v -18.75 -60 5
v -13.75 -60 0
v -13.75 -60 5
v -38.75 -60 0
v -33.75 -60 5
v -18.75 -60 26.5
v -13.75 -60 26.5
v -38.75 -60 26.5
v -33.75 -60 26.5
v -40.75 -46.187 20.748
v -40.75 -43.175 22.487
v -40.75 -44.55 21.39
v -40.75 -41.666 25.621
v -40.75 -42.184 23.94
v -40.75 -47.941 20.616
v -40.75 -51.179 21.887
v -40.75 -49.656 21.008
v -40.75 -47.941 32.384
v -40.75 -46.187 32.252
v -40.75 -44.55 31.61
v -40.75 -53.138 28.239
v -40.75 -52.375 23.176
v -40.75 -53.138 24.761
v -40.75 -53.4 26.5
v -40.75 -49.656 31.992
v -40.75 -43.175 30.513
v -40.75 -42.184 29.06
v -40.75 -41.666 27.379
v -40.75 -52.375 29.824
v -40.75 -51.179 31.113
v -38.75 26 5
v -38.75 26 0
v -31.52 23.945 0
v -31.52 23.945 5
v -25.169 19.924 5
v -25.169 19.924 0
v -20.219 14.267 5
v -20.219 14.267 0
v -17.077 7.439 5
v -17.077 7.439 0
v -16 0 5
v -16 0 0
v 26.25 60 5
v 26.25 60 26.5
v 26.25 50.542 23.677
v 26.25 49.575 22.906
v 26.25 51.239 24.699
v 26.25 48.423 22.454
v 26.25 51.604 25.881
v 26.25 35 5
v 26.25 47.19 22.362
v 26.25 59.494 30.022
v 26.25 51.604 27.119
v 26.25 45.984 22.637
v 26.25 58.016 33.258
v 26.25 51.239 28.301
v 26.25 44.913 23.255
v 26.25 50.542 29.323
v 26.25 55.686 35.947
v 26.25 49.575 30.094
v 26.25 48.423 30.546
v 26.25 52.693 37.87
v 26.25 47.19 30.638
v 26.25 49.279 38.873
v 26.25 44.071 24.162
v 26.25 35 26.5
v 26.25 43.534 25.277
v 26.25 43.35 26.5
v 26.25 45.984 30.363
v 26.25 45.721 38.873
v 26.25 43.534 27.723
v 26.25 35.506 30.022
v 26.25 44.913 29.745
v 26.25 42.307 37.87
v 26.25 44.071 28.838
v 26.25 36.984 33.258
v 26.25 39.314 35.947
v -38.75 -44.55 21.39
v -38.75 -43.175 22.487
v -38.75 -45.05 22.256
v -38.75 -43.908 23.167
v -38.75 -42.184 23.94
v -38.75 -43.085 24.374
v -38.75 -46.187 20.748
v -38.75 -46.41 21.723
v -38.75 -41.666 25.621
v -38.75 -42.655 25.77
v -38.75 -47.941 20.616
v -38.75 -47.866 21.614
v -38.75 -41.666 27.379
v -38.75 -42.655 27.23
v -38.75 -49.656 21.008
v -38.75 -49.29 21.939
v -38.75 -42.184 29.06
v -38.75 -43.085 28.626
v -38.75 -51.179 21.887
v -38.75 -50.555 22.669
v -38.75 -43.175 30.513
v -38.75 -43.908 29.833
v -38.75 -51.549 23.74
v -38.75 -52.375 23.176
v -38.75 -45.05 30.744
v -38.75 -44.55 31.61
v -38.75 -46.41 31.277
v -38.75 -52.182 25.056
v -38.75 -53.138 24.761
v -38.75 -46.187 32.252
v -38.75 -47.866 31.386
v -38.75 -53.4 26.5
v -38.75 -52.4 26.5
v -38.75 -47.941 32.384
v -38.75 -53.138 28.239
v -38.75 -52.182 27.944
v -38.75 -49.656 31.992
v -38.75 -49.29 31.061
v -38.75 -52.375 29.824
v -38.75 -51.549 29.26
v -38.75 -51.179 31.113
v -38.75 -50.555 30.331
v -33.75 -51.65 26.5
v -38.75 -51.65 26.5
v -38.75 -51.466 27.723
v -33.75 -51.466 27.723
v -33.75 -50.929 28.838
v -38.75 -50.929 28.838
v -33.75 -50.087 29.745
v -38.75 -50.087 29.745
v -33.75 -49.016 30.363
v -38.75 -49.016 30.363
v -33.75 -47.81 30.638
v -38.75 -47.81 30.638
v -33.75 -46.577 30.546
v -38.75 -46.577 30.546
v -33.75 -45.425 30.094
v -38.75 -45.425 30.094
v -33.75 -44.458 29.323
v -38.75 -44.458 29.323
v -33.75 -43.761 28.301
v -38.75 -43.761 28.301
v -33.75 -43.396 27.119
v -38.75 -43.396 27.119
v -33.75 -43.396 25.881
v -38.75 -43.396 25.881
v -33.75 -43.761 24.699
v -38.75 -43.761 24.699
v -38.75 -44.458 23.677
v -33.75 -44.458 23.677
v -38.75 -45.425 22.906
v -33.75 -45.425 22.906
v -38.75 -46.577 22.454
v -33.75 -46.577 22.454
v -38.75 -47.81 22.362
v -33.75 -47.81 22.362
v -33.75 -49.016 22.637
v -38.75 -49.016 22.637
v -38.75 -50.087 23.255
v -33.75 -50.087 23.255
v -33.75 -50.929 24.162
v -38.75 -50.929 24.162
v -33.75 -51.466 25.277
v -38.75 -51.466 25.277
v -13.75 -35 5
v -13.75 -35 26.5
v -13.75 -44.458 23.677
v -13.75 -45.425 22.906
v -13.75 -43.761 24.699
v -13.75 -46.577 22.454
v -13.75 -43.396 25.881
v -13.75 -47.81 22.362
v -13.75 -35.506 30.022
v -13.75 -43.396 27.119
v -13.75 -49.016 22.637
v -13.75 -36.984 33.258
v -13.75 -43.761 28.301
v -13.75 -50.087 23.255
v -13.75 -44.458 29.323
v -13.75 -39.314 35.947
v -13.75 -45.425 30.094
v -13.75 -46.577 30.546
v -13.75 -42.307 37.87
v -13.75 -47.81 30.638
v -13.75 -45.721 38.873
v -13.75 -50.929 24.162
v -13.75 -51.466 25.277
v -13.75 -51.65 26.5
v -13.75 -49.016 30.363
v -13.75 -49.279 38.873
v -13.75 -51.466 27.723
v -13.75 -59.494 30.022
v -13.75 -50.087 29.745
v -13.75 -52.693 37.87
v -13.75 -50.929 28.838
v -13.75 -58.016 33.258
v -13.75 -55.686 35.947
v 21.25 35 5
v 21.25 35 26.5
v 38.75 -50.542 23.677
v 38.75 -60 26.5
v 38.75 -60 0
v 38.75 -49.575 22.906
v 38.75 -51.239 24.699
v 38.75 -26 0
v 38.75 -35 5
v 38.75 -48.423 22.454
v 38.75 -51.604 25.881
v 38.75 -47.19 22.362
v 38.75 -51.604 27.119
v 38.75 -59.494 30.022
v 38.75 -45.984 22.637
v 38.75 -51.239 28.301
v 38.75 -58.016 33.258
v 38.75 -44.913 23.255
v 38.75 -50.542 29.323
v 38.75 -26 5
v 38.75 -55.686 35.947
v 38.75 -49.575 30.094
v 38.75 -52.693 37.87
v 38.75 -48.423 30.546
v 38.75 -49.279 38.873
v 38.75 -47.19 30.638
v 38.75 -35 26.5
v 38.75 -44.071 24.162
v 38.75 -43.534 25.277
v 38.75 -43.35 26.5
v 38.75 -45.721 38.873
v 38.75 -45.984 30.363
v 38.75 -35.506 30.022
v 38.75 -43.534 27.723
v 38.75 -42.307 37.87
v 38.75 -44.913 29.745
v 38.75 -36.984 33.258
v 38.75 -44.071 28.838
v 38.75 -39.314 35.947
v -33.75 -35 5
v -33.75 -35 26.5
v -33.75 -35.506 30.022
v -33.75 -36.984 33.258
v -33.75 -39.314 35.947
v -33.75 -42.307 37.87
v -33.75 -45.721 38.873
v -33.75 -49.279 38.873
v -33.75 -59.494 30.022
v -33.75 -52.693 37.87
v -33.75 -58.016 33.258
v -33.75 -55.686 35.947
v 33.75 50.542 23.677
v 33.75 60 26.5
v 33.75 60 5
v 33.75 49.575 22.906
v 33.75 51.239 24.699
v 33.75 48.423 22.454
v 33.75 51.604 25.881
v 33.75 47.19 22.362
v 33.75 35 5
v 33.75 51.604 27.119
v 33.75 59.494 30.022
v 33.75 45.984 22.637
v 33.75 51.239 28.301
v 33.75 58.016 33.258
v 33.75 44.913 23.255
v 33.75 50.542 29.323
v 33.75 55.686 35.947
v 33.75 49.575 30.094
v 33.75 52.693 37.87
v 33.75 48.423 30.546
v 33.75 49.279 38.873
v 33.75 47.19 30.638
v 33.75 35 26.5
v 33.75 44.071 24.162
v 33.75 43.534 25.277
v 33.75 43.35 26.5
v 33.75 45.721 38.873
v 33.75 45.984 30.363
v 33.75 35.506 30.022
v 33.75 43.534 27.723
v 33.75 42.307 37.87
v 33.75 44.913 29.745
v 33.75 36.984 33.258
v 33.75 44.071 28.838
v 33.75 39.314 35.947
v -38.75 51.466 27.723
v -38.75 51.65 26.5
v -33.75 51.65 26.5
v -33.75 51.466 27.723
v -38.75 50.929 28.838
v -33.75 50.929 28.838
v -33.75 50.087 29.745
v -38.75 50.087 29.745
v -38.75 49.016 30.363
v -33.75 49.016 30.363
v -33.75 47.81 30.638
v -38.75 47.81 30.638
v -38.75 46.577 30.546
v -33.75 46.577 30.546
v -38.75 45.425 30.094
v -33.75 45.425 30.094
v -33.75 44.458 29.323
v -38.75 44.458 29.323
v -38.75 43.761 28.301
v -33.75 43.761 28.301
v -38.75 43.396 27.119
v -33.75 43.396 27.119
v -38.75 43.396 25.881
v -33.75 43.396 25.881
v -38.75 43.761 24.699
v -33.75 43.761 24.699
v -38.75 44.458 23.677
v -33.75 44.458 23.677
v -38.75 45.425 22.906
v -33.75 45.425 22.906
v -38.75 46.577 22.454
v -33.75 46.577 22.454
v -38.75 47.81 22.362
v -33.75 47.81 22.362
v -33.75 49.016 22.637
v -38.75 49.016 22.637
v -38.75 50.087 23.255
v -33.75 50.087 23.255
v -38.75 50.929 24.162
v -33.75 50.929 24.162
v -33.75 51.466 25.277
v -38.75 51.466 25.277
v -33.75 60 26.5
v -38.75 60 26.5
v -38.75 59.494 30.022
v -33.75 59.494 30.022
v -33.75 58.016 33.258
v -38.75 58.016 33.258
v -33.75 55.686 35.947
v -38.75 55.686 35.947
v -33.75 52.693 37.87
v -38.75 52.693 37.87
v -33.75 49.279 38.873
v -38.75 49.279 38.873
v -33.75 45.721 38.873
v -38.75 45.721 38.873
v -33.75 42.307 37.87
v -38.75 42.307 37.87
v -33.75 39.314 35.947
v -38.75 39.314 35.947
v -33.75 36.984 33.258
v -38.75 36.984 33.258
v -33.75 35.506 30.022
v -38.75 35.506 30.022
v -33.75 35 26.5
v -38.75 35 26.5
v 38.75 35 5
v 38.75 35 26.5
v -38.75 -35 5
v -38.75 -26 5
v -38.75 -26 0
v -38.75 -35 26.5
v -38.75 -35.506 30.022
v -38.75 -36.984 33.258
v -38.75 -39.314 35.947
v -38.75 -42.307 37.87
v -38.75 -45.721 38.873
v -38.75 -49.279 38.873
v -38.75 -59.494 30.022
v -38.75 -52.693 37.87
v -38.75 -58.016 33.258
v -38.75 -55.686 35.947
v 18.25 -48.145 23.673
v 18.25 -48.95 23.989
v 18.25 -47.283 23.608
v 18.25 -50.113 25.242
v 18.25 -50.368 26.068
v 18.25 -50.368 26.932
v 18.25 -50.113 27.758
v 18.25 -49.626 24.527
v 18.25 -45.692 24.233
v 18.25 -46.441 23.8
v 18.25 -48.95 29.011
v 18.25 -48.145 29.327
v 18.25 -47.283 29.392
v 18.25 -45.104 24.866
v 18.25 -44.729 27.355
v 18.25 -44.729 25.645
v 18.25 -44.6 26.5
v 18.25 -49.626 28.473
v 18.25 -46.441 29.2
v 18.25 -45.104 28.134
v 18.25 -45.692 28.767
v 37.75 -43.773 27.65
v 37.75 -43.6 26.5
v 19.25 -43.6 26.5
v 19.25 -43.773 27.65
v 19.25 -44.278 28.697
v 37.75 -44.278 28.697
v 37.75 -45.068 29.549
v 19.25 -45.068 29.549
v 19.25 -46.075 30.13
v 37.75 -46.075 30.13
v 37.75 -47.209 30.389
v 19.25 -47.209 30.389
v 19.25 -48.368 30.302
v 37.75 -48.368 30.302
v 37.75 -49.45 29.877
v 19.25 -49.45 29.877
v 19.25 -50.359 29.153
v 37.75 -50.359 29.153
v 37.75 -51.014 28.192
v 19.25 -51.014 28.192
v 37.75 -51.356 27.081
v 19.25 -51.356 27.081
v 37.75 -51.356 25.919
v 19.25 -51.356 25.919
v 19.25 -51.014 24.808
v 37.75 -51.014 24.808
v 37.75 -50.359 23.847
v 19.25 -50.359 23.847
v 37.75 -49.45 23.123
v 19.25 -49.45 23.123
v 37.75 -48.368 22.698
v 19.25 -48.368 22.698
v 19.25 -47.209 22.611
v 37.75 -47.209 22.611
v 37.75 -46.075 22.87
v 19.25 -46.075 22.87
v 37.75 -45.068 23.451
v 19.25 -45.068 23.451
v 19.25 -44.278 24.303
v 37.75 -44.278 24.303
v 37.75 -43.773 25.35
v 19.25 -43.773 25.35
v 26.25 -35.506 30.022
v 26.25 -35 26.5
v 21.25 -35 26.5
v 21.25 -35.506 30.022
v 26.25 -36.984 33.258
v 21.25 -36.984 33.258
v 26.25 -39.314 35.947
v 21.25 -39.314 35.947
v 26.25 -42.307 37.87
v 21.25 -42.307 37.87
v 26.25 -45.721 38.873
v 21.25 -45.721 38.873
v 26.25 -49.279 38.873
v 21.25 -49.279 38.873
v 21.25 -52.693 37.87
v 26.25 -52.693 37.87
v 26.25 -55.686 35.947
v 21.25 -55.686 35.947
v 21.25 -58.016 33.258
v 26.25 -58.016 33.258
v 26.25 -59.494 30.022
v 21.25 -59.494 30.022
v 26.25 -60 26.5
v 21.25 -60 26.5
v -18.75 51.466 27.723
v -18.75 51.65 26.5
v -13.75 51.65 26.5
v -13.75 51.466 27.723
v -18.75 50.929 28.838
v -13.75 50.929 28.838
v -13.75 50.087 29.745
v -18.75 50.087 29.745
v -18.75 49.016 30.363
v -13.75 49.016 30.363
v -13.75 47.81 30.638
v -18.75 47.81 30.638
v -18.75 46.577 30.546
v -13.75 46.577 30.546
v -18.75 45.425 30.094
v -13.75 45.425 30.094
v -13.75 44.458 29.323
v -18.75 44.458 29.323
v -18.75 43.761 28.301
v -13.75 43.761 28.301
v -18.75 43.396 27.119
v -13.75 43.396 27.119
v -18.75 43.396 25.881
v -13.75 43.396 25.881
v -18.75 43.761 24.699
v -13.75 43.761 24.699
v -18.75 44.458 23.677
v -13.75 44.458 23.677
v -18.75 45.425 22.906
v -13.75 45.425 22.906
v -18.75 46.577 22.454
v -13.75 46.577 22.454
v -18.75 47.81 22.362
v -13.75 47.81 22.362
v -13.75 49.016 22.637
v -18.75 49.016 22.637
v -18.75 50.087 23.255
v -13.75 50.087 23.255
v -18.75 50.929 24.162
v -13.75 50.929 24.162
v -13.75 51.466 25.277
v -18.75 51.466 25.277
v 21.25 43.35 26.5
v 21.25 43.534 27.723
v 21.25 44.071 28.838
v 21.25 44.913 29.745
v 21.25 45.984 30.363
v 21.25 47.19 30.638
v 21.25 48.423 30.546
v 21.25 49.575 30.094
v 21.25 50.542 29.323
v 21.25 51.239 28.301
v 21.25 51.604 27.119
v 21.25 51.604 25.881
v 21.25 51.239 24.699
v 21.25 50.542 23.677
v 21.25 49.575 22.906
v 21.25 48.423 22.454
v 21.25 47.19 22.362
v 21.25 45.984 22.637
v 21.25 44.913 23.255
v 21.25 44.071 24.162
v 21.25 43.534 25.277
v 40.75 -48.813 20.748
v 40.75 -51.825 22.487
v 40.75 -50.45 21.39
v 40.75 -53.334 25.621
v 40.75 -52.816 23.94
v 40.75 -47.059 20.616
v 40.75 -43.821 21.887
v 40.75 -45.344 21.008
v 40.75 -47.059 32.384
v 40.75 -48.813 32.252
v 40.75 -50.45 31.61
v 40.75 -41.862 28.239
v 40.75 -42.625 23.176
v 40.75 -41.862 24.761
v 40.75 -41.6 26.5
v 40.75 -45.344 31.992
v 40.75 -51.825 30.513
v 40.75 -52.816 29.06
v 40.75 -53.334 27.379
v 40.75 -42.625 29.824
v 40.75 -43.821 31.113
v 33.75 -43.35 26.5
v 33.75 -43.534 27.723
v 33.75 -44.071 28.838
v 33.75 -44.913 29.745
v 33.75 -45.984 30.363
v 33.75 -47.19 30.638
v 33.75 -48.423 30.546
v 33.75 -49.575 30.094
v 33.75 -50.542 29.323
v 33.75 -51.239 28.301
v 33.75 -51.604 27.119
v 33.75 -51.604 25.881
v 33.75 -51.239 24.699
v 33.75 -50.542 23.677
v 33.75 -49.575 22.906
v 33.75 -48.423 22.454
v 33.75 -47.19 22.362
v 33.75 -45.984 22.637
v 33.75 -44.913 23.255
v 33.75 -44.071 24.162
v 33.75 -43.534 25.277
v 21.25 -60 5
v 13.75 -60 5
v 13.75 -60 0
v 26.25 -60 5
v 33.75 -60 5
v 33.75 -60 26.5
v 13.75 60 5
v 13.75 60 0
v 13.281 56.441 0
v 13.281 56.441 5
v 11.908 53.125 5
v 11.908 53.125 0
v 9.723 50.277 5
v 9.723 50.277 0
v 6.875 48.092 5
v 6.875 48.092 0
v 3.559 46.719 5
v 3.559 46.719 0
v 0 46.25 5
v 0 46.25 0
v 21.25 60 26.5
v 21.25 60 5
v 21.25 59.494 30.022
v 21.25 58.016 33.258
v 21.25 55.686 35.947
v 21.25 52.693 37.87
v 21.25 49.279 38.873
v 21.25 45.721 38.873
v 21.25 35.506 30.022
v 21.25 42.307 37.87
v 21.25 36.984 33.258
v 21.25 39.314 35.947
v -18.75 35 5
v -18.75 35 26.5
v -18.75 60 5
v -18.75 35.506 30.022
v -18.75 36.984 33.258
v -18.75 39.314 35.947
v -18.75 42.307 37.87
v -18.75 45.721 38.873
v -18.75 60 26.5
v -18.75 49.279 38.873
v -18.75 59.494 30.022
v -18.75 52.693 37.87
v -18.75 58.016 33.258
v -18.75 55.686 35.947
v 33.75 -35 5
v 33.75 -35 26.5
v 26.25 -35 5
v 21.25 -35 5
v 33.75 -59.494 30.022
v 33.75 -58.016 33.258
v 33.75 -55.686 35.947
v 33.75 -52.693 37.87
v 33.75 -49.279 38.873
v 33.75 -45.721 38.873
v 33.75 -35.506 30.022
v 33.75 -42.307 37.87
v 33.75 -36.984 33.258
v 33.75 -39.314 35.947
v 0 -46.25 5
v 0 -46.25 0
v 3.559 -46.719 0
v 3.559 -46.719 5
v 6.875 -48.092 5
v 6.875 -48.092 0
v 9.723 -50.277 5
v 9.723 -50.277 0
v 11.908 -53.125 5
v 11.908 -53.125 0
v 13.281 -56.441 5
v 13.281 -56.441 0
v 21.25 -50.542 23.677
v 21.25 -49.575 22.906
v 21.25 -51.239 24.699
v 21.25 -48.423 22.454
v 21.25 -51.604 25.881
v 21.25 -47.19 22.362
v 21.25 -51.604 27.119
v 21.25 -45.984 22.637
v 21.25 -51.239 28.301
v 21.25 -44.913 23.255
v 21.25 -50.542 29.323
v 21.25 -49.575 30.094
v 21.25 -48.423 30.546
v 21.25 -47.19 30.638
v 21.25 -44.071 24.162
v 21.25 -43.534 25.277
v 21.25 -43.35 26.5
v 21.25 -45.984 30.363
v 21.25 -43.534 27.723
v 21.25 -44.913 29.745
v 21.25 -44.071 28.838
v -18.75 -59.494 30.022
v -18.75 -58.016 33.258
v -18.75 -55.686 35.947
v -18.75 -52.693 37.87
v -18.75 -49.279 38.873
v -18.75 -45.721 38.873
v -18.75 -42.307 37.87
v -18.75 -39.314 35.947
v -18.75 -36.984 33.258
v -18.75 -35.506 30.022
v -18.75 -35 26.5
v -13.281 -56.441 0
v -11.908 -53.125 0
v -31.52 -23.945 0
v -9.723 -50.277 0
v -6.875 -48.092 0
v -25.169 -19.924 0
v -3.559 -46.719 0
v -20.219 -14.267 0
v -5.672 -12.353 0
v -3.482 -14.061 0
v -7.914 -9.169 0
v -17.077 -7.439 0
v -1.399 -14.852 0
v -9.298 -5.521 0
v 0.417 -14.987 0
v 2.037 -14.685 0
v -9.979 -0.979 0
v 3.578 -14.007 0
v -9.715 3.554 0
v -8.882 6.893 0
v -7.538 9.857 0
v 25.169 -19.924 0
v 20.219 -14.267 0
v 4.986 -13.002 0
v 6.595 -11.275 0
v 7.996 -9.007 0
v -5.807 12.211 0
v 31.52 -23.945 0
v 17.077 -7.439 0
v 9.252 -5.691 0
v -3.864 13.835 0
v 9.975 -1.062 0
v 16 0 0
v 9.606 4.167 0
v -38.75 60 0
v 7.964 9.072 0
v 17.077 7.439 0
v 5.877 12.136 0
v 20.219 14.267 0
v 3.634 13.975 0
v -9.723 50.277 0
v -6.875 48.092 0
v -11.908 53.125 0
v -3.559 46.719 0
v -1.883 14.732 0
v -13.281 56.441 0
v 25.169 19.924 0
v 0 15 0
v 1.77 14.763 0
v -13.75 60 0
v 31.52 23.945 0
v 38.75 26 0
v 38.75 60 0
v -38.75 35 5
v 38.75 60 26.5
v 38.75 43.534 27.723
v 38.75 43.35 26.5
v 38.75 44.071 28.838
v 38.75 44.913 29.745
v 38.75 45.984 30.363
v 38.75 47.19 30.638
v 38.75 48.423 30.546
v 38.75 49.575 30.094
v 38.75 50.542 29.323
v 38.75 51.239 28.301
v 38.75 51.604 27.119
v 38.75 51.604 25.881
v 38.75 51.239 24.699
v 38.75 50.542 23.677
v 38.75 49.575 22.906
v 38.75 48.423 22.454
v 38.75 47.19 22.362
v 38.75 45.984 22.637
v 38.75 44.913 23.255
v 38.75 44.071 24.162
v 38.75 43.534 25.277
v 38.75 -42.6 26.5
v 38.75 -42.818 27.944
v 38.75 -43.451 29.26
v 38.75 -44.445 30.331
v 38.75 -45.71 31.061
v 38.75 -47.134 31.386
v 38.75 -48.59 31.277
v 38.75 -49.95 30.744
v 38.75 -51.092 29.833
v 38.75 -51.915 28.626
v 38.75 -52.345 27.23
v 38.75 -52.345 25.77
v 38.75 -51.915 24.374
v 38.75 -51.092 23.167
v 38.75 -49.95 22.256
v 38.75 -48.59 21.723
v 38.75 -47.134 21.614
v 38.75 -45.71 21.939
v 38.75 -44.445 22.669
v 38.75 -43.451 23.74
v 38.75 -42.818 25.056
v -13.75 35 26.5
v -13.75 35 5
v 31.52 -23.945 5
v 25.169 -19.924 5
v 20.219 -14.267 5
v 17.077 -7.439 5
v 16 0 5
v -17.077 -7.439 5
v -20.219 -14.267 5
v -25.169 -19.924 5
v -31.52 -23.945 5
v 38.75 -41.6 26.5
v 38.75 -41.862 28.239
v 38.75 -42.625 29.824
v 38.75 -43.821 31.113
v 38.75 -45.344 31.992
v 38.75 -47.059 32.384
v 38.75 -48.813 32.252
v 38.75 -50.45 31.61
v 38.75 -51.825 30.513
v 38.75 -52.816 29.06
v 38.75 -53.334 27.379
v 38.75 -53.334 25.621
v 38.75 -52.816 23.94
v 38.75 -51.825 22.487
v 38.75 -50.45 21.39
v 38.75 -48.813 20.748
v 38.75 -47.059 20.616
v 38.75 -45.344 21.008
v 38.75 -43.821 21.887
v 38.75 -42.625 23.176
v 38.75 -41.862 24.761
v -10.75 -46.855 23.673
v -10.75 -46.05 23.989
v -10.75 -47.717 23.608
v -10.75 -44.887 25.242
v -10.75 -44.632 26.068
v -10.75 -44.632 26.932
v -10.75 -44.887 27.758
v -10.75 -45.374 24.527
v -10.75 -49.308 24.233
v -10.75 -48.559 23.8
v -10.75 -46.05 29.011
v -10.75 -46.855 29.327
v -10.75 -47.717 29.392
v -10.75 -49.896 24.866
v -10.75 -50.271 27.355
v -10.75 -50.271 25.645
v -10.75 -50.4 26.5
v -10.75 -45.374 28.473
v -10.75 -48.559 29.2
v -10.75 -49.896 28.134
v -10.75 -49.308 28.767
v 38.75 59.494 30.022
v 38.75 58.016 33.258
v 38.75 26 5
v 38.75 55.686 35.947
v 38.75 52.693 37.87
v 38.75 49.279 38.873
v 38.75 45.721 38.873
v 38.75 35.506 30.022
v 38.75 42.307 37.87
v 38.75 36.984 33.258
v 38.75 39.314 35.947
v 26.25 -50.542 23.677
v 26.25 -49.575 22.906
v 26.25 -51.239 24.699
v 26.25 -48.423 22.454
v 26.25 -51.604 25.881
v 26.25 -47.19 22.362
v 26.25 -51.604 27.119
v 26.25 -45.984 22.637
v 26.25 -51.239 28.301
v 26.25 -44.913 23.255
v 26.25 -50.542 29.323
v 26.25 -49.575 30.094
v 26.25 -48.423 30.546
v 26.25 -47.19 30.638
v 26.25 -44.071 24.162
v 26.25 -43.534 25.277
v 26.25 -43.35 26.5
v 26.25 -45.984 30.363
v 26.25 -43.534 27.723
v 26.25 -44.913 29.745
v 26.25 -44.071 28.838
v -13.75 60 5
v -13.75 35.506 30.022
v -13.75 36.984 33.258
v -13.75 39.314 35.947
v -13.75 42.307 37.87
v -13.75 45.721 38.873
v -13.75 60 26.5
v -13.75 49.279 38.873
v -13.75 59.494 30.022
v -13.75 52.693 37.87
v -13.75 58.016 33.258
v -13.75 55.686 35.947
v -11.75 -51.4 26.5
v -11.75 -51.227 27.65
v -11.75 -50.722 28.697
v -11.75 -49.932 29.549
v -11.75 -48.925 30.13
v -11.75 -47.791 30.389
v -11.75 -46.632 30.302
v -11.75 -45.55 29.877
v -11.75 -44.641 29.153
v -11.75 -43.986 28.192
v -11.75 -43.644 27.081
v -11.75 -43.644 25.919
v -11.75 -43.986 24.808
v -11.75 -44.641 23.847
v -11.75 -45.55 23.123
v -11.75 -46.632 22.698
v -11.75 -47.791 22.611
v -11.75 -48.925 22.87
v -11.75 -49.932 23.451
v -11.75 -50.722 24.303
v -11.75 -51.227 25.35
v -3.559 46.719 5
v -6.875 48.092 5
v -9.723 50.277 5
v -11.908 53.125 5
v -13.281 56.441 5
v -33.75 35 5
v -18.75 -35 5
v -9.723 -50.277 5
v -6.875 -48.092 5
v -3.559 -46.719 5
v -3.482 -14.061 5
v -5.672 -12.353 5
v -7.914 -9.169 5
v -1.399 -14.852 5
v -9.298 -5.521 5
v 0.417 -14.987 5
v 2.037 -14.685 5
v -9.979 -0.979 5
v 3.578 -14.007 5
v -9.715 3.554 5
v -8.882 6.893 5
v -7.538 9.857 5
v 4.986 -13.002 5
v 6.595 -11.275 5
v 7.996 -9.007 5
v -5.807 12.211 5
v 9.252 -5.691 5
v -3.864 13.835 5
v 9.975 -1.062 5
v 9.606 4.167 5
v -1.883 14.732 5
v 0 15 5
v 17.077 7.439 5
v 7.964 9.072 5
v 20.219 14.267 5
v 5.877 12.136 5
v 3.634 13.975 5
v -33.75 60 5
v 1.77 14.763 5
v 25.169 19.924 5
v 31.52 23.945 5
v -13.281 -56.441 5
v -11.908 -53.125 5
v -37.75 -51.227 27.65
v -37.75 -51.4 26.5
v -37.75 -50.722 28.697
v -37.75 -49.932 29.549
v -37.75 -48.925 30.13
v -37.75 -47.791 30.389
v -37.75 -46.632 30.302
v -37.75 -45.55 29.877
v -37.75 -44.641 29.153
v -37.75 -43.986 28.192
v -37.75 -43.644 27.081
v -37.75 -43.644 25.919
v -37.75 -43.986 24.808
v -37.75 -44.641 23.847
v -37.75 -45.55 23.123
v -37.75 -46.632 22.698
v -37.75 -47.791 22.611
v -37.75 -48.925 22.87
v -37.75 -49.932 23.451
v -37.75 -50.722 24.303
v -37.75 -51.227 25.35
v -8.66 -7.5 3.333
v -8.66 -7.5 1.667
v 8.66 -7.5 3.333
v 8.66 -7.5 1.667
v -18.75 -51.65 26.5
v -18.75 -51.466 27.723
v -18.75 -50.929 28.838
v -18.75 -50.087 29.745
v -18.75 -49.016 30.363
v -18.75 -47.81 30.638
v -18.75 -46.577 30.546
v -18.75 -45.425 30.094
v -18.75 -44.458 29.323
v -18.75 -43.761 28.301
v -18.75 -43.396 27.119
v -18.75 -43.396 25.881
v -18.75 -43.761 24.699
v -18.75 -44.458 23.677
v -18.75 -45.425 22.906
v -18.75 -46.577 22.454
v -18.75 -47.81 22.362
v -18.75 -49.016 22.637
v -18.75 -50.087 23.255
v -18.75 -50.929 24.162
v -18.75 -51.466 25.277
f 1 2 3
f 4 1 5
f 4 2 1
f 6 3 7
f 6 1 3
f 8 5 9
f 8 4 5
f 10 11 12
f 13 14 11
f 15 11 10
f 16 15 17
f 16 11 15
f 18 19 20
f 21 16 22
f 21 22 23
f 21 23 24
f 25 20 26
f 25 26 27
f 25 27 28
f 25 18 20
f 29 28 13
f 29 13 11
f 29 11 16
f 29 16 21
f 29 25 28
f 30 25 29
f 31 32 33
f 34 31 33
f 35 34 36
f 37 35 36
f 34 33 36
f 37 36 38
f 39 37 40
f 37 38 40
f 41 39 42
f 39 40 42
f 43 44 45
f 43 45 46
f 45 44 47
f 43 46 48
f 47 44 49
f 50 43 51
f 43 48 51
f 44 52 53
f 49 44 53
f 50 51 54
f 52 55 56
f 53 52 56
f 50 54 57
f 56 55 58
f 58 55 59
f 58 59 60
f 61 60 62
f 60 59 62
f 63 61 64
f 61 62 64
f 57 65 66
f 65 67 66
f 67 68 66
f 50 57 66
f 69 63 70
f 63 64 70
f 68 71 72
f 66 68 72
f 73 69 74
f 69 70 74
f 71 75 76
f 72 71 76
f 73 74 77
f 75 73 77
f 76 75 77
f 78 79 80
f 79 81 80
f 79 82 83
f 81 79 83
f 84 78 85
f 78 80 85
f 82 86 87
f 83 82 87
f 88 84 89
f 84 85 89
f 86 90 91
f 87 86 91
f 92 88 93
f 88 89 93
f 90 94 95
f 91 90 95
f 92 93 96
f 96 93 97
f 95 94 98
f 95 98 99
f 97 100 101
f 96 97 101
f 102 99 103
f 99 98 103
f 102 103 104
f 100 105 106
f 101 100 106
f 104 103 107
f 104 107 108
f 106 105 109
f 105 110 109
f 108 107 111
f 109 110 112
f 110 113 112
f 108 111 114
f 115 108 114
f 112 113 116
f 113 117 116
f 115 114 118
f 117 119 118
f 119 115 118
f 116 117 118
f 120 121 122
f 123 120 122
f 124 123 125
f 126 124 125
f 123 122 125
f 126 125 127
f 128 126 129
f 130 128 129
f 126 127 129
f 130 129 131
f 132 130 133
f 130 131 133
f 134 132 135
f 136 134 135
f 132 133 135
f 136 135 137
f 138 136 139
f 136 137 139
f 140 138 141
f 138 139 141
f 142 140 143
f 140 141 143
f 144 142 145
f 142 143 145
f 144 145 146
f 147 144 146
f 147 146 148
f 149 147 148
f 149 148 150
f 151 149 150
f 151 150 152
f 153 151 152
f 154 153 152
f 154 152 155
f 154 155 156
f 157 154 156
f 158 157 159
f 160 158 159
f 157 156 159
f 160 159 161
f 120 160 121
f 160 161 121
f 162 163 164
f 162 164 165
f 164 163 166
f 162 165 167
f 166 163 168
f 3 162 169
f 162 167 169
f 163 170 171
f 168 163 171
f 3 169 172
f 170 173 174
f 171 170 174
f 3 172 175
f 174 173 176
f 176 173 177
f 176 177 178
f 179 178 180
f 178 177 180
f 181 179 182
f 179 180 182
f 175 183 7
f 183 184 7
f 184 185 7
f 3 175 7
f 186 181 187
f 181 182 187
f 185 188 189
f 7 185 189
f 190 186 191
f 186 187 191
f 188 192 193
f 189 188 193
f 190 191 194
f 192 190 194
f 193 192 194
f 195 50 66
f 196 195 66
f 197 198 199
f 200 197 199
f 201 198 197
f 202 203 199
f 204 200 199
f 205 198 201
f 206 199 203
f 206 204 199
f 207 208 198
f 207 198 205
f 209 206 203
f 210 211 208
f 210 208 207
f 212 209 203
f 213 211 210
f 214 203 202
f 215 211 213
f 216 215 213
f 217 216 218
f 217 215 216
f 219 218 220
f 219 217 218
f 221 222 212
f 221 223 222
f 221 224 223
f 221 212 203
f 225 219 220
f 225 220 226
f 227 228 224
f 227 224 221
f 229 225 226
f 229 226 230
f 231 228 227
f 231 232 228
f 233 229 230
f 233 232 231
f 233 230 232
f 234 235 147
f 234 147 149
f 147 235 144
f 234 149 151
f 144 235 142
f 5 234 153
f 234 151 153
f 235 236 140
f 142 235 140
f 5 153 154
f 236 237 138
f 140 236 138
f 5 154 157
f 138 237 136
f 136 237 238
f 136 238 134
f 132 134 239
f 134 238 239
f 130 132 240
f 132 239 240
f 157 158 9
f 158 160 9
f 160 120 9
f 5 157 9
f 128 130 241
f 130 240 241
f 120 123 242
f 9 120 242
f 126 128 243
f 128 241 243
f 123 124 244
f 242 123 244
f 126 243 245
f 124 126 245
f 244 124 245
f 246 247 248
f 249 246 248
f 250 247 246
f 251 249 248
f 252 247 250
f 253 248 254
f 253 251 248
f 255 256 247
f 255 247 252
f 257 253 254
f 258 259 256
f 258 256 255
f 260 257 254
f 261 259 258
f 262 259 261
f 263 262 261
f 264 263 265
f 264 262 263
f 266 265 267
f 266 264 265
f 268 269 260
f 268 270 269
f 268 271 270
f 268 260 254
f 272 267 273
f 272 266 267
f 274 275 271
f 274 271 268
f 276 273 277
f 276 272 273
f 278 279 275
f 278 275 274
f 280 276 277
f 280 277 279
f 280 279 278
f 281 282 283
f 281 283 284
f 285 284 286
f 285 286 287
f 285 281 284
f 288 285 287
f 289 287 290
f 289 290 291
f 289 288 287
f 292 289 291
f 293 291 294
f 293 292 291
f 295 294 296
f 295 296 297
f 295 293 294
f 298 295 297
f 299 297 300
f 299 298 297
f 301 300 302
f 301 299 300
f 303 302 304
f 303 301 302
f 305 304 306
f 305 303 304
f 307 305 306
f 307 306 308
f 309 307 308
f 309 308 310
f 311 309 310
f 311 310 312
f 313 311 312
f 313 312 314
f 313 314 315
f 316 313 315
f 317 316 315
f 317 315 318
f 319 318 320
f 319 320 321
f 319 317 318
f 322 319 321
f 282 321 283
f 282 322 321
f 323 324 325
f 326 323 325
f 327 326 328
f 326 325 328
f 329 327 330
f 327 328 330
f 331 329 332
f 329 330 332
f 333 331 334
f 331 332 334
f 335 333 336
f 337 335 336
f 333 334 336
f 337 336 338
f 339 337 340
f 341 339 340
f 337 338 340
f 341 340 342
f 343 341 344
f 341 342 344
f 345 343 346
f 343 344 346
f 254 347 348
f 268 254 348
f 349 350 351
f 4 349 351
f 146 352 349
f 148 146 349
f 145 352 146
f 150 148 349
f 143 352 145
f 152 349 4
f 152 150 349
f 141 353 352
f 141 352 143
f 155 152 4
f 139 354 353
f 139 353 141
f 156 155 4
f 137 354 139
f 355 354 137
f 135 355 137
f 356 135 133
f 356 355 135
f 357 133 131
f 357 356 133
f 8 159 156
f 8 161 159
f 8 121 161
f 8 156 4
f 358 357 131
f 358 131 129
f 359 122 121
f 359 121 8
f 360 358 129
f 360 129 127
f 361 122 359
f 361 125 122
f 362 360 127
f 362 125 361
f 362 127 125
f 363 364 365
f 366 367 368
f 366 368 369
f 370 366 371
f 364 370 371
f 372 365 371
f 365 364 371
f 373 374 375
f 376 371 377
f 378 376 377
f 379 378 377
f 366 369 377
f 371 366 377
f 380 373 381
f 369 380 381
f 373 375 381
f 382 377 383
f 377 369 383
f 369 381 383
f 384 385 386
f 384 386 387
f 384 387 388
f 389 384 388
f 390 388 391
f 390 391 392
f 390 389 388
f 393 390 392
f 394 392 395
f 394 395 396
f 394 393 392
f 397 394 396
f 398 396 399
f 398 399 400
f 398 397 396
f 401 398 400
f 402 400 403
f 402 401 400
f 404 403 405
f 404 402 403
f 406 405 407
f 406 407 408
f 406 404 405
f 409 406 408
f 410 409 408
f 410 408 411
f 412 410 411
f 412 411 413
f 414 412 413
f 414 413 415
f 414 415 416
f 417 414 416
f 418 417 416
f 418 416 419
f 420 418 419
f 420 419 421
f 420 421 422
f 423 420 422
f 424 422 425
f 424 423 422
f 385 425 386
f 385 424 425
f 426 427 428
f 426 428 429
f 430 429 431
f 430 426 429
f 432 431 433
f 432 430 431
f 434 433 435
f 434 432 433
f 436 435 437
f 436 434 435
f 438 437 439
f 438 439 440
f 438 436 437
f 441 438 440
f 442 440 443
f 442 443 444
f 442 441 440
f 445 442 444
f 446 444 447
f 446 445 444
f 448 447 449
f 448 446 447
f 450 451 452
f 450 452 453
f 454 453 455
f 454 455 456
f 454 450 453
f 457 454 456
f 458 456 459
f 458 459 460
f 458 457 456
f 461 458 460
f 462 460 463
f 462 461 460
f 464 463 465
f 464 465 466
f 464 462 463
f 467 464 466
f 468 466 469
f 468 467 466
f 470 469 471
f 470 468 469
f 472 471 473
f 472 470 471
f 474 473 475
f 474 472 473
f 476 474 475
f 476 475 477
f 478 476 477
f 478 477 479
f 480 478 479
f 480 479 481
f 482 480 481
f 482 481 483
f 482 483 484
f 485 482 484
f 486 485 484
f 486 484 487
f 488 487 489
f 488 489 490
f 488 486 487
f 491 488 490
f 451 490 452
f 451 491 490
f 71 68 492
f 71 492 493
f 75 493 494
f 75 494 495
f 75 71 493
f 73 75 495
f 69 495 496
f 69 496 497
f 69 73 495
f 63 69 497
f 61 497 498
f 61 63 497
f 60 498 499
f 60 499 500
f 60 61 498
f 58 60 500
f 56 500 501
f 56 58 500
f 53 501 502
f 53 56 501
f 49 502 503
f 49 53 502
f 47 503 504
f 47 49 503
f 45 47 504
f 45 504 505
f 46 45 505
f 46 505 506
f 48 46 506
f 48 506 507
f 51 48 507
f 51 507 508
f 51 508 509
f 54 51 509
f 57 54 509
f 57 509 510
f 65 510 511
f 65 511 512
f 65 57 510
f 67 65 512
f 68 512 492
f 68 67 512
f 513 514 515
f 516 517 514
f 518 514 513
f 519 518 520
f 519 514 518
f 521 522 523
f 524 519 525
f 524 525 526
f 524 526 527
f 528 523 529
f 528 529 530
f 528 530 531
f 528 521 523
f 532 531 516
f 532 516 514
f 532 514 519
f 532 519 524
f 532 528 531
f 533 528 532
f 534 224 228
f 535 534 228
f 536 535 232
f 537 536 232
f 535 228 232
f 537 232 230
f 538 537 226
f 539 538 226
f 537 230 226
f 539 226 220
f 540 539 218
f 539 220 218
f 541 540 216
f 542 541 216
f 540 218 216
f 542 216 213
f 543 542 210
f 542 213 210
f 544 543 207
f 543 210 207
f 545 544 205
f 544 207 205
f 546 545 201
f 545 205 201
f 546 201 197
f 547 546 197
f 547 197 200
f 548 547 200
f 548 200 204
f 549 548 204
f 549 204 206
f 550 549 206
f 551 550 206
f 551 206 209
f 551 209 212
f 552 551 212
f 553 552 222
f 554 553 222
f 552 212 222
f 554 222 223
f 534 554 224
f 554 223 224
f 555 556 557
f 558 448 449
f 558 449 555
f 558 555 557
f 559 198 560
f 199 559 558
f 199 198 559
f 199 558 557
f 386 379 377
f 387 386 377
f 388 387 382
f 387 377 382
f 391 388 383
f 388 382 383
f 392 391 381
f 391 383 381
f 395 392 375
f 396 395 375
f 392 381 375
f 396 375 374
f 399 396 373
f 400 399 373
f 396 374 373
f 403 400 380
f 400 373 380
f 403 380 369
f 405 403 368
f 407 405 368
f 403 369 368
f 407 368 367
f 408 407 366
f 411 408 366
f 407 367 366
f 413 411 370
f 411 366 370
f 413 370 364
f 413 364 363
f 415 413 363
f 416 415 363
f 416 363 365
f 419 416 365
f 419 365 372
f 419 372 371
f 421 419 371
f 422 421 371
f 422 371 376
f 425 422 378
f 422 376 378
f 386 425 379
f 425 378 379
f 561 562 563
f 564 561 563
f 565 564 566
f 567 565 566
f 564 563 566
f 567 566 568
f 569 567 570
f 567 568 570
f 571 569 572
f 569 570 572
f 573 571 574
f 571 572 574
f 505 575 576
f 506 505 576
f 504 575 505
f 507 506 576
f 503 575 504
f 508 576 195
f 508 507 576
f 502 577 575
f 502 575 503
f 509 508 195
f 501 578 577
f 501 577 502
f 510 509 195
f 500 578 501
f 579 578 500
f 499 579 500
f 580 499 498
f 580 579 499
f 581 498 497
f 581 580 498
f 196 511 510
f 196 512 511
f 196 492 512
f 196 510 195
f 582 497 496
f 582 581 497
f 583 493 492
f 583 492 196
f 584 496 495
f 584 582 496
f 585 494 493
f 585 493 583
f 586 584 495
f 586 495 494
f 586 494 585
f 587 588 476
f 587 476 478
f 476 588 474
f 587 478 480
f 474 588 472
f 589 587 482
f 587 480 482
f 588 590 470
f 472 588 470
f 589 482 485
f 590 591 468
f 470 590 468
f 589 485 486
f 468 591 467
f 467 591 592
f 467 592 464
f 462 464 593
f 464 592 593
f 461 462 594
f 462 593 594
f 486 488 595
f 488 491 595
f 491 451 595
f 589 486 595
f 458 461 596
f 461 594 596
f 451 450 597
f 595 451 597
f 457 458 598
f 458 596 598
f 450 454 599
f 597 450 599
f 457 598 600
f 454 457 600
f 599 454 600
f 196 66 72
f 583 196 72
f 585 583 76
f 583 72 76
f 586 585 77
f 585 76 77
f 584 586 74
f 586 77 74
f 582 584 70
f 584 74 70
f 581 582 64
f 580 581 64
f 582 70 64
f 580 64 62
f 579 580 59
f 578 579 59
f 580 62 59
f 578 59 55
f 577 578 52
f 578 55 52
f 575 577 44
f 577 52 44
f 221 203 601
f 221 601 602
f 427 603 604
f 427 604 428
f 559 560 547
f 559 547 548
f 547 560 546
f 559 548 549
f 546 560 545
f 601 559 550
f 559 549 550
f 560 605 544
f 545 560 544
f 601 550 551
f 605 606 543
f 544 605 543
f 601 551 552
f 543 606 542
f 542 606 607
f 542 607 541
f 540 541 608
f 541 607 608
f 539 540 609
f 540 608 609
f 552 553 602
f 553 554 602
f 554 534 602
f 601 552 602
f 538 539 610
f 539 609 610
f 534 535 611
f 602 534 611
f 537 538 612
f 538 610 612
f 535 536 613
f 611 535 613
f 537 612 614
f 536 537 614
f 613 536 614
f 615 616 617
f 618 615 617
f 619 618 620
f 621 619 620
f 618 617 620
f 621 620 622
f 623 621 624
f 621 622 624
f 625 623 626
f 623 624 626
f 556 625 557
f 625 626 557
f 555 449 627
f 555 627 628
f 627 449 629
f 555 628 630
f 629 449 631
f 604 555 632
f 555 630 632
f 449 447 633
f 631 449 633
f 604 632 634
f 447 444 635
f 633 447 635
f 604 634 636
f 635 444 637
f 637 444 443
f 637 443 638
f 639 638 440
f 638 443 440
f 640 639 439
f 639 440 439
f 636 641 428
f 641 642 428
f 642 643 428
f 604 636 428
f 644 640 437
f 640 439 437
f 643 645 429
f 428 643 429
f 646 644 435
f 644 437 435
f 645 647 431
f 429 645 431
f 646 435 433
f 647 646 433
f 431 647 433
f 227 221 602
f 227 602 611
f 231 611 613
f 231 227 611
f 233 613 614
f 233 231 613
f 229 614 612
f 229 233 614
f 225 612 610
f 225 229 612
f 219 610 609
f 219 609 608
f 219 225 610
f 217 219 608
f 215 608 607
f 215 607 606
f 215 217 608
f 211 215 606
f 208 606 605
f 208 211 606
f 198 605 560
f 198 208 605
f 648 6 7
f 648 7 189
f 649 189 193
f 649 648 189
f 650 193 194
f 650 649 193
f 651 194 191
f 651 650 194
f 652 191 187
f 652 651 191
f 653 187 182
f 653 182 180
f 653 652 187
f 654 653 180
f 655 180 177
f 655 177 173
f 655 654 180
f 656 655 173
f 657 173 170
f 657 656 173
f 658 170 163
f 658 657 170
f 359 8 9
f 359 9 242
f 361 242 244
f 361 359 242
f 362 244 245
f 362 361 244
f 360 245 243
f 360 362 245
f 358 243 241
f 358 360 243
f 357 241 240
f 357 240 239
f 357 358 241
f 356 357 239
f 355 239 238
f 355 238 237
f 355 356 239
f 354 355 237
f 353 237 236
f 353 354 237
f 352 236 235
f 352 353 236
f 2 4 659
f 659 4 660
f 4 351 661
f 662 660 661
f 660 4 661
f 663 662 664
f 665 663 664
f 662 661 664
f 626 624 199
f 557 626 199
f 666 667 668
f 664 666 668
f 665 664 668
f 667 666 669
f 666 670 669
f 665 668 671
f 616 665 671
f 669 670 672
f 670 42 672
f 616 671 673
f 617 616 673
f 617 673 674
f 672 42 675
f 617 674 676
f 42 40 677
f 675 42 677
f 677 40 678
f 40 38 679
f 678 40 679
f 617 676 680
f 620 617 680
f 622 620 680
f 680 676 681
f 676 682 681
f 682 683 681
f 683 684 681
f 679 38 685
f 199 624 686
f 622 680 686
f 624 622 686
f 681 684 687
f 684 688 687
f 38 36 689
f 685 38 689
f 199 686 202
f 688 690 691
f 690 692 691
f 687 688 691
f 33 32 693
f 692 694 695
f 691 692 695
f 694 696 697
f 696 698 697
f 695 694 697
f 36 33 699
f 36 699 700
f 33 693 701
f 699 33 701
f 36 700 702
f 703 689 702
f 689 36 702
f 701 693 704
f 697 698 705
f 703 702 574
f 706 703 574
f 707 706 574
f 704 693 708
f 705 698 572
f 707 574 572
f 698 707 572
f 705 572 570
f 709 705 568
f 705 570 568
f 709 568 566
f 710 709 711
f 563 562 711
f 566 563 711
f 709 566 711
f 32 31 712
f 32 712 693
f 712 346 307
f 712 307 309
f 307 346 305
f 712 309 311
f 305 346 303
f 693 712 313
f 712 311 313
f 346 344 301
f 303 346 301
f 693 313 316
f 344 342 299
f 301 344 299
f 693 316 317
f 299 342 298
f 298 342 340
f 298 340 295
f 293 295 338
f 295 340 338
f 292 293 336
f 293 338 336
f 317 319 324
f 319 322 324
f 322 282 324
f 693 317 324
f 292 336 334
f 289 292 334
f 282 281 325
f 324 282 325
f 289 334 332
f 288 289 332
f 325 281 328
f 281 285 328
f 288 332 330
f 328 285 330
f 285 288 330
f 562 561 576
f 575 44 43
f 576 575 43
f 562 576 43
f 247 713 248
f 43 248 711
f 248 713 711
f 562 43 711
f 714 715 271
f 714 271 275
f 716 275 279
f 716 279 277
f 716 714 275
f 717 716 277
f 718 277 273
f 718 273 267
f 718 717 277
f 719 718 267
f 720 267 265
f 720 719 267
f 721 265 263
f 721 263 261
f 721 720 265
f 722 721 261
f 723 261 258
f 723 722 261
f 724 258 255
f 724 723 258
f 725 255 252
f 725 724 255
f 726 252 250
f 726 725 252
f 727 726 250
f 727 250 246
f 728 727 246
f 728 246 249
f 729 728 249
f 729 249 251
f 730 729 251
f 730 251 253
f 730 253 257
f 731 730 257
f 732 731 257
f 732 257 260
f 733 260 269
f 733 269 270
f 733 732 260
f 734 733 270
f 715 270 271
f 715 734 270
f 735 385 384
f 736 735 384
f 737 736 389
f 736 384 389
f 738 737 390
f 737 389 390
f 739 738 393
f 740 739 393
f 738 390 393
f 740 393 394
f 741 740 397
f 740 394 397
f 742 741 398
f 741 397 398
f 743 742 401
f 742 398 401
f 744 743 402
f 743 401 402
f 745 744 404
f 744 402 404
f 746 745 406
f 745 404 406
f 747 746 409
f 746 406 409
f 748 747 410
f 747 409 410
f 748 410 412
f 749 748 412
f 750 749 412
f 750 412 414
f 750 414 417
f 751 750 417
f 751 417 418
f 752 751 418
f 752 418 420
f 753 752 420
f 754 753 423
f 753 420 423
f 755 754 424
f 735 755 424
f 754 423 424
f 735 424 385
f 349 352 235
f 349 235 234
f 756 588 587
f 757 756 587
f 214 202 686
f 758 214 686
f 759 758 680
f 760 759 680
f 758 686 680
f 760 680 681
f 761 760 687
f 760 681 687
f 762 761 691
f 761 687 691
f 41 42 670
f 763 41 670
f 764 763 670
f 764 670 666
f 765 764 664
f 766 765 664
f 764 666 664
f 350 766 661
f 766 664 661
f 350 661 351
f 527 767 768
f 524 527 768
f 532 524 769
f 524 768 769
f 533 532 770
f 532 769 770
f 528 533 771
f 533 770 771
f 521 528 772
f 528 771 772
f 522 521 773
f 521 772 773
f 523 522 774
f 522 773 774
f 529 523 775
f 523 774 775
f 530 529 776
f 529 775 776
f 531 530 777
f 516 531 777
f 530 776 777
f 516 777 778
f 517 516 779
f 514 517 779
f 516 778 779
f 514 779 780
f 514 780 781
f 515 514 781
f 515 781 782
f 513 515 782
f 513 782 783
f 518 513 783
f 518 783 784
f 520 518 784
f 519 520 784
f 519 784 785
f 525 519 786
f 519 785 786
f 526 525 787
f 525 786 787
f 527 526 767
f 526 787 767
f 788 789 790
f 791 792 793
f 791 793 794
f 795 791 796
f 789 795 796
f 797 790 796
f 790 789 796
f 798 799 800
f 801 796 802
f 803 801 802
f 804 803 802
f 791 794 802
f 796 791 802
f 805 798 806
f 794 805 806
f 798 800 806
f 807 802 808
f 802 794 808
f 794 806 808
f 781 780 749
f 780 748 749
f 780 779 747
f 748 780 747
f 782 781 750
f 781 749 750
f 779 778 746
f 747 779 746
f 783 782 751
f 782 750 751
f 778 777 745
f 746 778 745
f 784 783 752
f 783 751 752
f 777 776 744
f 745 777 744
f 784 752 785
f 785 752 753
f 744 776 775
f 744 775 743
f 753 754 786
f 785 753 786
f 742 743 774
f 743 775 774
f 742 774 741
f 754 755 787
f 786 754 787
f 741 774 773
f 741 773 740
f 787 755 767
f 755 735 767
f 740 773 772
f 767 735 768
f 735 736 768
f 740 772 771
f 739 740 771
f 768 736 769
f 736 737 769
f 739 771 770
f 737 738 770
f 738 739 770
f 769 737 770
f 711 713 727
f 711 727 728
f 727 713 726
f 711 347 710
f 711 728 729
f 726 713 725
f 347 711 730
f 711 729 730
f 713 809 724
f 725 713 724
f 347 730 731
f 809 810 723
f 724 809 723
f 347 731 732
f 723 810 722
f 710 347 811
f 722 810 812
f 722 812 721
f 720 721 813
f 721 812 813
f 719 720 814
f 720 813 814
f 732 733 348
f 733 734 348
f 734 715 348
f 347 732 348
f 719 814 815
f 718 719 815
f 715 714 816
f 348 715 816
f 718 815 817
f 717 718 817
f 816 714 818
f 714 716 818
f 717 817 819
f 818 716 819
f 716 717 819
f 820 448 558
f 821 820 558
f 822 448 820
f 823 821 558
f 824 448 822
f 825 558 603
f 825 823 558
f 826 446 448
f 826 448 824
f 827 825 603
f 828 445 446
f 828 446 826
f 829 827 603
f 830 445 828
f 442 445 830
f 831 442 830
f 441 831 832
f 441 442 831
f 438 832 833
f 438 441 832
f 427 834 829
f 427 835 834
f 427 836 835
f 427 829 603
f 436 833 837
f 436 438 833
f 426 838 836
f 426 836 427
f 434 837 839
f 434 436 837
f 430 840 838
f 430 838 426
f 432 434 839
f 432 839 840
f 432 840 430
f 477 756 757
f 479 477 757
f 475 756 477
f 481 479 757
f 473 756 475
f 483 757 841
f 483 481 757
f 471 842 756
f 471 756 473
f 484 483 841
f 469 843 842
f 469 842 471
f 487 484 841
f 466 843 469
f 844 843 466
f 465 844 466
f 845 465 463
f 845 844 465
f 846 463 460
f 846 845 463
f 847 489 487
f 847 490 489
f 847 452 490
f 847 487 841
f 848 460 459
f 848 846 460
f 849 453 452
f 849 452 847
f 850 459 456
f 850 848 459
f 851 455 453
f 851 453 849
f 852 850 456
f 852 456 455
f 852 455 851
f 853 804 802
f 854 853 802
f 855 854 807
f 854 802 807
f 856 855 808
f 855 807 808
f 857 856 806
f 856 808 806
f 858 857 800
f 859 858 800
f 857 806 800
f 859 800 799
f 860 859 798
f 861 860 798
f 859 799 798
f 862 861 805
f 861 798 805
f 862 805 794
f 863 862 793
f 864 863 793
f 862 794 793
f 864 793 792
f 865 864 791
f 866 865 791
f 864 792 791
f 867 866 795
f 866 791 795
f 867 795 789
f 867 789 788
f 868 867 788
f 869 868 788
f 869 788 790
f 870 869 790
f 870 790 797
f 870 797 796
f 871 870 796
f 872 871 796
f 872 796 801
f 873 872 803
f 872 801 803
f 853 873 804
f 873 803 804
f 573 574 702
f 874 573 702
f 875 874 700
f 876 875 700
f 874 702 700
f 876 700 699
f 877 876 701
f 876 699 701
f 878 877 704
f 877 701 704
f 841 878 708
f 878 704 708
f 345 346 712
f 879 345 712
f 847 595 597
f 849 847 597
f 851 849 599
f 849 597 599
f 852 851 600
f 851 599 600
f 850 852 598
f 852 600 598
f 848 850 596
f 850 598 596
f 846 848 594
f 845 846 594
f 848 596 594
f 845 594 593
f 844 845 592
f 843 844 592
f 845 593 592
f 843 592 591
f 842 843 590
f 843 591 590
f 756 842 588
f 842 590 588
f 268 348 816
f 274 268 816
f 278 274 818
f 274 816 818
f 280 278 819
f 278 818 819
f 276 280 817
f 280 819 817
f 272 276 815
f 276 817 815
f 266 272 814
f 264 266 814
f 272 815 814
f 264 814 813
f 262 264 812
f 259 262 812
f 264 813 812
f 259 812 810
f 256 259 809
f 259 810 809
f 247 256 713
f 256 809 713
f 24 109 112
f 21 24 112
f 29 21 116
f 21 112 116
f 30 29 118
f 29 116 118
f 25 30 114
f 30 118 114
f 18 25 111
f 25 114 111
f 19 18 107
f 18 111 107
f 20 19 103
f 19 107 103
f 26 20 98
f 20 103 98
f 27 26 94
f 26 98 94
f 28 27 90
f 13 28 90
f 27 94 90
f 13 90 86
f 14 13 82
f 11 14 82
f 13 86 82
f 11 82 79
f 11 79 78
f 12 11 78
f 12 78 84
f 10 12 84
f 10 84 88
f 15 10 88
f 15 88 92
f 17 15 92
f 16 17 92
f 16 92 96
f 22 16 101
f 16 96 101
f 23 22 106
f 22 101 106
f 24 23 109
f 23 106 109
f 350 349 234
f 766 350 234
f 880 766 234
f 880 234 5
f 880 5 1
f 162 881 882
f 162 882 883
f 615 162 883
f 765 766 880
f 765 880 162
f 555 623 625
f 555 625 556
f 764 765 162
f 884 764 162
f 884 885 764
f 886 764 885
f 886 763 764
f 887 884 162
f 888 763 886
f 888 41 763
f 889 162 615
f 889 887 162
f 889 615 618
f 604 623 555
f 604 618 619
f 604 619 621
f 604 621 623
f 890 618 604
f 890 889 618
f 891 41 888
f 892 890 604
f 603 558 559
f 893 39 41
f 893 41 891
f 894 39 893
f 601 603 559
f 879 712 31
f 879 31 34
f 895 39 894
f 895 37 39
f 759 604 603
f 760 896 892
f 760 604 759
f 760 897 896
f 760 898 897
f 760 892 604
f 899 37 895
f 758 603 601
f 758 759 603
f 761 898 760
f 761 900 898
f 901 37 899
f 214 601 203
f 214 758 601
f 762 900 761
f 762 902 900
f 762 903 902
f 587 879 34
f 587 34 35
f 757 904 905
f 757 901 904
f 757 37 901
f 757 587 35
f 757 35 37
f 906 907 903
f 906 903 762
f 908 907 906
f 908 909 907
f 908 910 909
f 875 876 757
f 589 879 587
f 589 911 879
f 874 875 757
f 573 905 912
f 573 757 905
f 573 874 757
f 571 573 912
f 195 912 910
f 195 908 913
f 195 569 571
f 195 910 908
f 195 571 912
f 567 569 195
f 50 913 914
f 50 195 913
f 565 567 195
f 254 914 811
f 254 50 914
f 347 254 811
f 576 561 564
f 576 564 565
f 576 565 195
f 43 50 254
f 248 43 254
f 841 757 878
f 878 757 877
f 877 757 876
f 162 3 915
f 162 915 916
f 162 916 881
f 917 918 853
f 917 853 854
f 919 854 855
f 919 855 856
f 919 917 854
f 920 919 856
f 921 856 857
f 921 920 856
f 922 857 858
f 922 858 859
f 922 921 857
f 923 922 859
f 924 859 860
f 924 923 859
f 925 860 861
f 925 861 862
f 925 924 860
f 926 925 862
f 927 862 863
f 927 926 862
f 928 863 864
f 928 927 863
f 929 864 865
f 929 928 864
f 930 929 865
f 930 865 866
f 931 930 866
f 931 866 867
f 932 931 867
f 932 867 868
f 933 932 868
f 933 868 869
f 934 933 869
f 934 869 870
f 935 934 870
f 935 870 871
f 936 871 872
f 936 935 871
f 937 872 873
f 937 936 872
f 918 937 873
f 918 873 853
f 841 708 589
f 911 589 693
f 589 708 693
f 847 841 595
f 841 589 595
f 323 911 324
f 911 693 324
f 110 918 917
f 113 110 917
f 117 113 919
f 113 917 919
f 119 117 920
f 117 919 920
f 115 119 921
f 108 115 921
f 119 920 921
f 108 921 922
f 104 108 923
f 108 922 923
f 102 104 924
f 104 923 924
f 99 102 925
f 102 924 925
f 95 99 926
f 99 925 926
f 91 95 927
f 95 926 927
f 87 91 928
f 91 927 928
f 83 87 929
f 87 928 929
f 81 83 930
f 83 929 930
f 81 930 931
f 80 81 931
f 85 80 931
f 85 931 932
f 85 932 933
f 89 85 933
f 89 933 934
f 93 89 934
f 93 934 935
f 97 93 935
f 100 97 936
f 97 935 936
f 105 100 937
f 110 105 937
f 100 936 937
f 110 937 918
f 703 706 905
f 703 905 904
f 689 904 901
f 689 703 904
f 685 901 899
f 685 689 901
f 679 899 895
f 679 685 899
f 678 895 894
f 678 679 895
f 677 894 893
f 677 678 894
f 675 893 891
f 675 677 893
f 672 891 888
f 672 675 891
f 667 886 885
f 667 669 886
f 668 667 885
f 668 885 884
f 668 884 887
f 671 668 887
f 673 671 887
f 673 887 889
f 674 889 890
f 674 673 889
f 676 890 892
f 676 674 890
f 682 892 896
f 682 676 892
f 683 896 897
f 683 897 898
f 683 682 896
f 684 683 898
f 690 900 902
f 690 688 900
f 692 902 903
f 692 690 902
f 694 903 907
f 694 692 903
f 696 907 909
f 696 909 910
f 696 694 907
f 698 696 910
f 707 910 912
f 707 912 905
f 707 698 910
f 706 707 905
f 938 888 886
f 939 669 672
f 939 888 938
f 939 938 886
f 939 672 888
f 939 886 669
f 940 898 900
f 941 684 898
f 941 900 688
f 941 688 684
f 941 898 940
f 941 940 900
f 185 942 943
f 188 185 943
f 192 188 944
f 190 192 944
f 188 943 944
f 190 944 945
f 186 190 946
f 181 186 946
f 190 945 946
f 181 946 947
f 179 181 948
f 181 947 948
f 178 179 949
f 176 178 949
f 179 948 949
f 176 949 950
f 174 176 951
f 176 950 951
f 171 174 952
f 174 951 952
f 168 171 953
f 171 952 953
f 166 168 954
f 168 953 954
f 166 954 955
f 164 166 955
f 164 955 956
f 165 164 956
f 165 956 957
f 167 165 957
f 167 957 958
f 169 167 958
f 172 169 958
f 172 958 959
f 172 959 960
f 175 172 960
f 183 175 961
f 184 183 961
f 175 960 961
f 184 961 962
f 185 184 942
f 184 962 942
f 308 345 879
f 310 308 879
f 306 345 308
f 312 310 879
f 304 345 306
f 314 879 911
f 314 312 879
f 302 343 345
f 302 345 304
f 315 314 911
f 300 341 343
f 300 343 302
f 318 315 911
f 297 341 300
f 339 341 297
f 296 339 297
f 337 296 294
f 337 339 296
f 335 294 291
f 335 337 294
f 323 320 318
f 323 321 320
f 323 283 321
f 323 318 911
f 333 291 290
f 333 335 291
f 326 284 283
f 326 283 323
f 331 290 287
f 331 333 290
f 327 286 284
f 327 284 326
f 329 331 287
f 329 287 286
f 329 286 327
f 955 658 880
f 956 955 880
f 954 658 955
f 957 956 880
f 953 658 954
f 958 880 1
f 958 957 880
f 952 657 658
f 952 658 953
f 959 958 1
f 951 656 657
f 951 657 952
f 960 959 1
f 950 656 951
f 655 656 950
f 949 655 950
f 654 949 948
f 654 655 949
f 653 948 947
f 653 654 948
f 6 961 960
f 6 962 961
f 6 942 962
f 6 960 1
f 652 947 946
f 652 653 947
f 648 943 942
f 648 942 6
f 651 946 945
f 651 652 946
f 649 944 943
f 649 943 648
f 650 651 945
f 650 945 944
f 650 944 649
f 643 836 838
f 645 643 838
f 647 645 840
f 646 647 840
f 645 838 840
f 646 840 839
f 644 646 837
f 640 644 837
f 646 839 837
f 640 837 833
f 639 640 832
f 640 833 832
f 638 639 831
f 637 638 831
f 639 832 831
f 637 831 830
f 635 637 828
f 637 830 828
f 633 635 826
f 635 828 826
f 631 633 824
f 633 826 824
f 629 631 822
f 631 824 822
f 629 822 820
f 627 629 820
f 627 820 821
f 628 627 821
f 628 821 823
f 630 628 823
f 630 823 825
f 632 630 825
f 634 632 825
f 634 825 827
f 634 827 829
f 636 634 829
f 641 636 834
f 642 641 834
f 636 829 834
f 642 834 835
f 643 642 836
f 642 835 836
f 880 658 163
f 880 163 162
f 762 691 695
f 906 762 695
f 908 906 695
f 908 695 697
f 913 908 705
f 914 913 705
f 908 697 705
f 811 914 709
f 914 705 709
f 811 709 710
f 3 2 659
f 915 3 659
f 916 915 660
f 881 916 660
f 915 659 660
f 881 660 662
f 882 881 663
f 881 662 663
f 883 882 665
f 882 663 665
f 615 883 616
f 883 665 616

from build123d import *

# Parameters (mm, degrees)
F3_DEPTH   = 5
F6_R       = 4.15
F7_DEPTH   = 5
F9_R       = 4.15
F10_DEPTH  = 5
F13_R      = 4.15
F14_DEPTH  = 5
F15_R      = 4.15
F16_DEPTH  = 5
F17_R      = 3.9
F18_DEPTH  = 20.5
F19_R      = 5.9
F20_DEPTH  = 2
F21_R      = 3.9
F22_DEPTH  = 28
F23_R      = 5.9
F24_DEPTH  = 2
F25_SIZE   = 1
F25_2_SIZE = 1


# Not quite as in the source:
# - a pattern or mirror of a feature is missing from the dataset's text; its kind, count and spacing are read off the source's solid


with BuildPart() as f3:
    # F2 (on Top) → F3 (new body)
    with BuildSketch(Plane.XY):
        with BuildLine():
            ThreePointArc((38.75, -26), (22.4904434906, -17.2739869457), (16, 0))
            ThreePointArc((16, 0), (22.4904434906, 17.2739869457), (38.75, 26))
            Line((38.75, 26), (38.75, 60))
            Line((38.75, 60), (13.75, 60))
            ThreePointArc((13.75, 60), (9.7227182413, 50.2772817587), (0, 46.25))
            ThreePointArc((0, 46.25), (-9.7227182413, 50.2772817587), (-13.75, 60))
            Line((-13.75, 60), (-38.75, 60))
            Line((-38.75, 60), (-38.75, 26))
            ThreePointArc((-38.75, 26), (-22.4904434906, 17.2739869457), (-16, 0))
            ThreePointArc((-16, 0), (-22.4904434906, -17.2739869457), (-38.75, -26))
            Line((-38.75, -26), (-38.75, -60))
            Line((-38.75, -60), (-13.75, -60))
            ThreePointArc((-13.75, -60), (-9.7227182413, -50.2772817587), (0, -46.25))
            ThreePointArc((0, -46.25), (9.7227182413, -50.2772817587), (13.75, -60))
            Line((13.75, -60), (38.75, -60))
            Line((38.75, -60), (38.75, -26))
        make_face()
        with BuildLine():
            add(Edge.make_bspline(
                [(0, 15), (-17.3205080757, 15), (-8.6602540378, -7.5), (0, -30), (8.6602540378, -7.5), (17.3205080757, 15), (0, 15)],
                knots=[0, 0, 0, 2.0943951024, 2.0943951024, 4.1887902048, 4.1887902048, 6.2831853072, 6.2831853072, 6.2831853072], degree=2, weights=[1, 0.5, 1, 0.5, 1, 0.5, 1]))
        make_face(mode=Mode.SUBTRACT)
    extrude(amount=F3_DEPTH)

    # F6 (on offset) → F7 (join)
    with BuildSketch(Plane.YZ.offset(38.75)):
        with BuildLine():
            Line((-60, 5), (-35, 5))
            Line((-35, 5), (-35, 26.5))
            ThreePointArc((-35, 26.5), (-47.5, 39), (-60, 26.5))
            Line((-60, 26.5), (-60, 5))
        make_face()
        with Locations((-47.5, 26.5)):
            Circle(F6_R, mode=Mode.SUBTRACT)
    f7 = extrude(amount=-F7_DEPTH)

    # F7_copies: F7 across plane
    add(f7.mirror(Plane.ZX))

    # F9 (on offset) → F10 (join)
    with BuildSketch(Plane.YZ.offset(26.25)):
        with BuildLine():
            Line((-60, 5), (-35, 5))
            Line((-35, 5), (-35, 26.5))
            ThreePointArc((-35, 26.5), (-47.5, 39), (-60, 26.5))
            Line((-60, 26.5), (-60, 5))
        make_face()
        with Locations((-47.5, 26.5)):
            Circle(F9_R, mode=Mode.SUBTRACT)
    f10 = extrude(amount=-F10_DEPTH)

    # F10_copies: F10 across plane
    add(f10.mirror(Plane.ZX))

    # F13 (on offset) → F14 (join)
    with BuildSketch(Plane(origin=(-38.75, 0, 0), x_dir=(0, -1, 0), z_dir=(-1, 0, 0))):
        with BuildLine():
            Line((35, 26.5), (35, 5))
            Line((35, 5), (60, 5))
            Line((60, 5), (60, 26.5))
            ThreePointArc((60, 26.5), (47.5, 39), (35, 26.5))
        make_face()
        with Locations((47.5, 26.5)):
            Circle(F13_R, mode=Mode.SUBTRACT)
    f14 = extrude(amount=-F14_DEPTH)

    # F14_copies: F14 across plane
    add(f14.mirror(Plane.ZX))

    # F15 (on offset) → F16 (join)
    with BuildSketch(Plane(origin=(-18.75, 0, 0), x_dir=(0, -1, 0), z_dir=(-1, 0, 0))):
        with BuildLine():
            Line((35, 26.5), (35, 5))
            Line((35, 5), (60, 5))
            Line((60, 5), (60, 26.5))
            ThreePointArc((60, 26.5), (47.5, 39), (35, 26.5))
        make_face()
        with Locations((47.5, 26.5)):
            Circle(F15_R, mode=Mode.SUBTRACT)
    f16 = extrude(amount=-F16_DEPTH)

    # F16_copies: F16 across plane
    add(f16.mirror(Plane.ZX))


with BuildPart() as f18:
    # F17 (on face) → F18 (new body, through all)
    with BuildSketch(Plane.YZ.offset(38.75)):
        with Locations((-47.5, 26.5)):
            Circle(F17_R)
    extrude(amount=-F18_DEPTH)

    # F19 (on face) → F20 (join)
    with BuildSketch(Plane.YZ.offset(38.75)):
        with Locations((-47.5, 26.5)):
            Circle(F19_R)
    extrude(amount=F20_DEPTH)

    # F25
    f25_edges = [f18.edges().sort_by_distance(p)[0] for p in [
        (18.25, -51.4, 26.5),
        (38.75, -51.4, 26.5),
    ]]
    chamfer(f25_edges, length=F25_SIZE)


with BuildPart() as f22:
    # F21 (on face) → F22 (new body, through all)
    with BuildSketch(Plane(origin=(-38.75, 0, 0), x_dir=(0, -1, 0), z_dir=(-1, 0, 0))):
        with Locations((47.5, 26.5)):
            Circle(F21_R)
    extrude(amount=-F22_DEPTH)

    # F23 (on face) → F24 (join)
    with BuildSketch(Plane(origin=(-38.75, 0, 0), x_dir=(0, -1, 0), z_dir=(-1, 0, 0))):
        with Locations((47.5, 26.5)):
            Circle(F23_R)
    extrude(amount=F24_DEPTH)

    # F25#2
    f25_2_edges = [f22.edges().sort_by_distance(p)[0] for p in [
        (-38.75, -43.6, 26.5),
        (-10.75, -43.6, 26.5),
    ]]
    chamfer(f25_2_edges, length=F25_2_SIZE)


solid = Compound([f3.part, f18.part, f22.part])
